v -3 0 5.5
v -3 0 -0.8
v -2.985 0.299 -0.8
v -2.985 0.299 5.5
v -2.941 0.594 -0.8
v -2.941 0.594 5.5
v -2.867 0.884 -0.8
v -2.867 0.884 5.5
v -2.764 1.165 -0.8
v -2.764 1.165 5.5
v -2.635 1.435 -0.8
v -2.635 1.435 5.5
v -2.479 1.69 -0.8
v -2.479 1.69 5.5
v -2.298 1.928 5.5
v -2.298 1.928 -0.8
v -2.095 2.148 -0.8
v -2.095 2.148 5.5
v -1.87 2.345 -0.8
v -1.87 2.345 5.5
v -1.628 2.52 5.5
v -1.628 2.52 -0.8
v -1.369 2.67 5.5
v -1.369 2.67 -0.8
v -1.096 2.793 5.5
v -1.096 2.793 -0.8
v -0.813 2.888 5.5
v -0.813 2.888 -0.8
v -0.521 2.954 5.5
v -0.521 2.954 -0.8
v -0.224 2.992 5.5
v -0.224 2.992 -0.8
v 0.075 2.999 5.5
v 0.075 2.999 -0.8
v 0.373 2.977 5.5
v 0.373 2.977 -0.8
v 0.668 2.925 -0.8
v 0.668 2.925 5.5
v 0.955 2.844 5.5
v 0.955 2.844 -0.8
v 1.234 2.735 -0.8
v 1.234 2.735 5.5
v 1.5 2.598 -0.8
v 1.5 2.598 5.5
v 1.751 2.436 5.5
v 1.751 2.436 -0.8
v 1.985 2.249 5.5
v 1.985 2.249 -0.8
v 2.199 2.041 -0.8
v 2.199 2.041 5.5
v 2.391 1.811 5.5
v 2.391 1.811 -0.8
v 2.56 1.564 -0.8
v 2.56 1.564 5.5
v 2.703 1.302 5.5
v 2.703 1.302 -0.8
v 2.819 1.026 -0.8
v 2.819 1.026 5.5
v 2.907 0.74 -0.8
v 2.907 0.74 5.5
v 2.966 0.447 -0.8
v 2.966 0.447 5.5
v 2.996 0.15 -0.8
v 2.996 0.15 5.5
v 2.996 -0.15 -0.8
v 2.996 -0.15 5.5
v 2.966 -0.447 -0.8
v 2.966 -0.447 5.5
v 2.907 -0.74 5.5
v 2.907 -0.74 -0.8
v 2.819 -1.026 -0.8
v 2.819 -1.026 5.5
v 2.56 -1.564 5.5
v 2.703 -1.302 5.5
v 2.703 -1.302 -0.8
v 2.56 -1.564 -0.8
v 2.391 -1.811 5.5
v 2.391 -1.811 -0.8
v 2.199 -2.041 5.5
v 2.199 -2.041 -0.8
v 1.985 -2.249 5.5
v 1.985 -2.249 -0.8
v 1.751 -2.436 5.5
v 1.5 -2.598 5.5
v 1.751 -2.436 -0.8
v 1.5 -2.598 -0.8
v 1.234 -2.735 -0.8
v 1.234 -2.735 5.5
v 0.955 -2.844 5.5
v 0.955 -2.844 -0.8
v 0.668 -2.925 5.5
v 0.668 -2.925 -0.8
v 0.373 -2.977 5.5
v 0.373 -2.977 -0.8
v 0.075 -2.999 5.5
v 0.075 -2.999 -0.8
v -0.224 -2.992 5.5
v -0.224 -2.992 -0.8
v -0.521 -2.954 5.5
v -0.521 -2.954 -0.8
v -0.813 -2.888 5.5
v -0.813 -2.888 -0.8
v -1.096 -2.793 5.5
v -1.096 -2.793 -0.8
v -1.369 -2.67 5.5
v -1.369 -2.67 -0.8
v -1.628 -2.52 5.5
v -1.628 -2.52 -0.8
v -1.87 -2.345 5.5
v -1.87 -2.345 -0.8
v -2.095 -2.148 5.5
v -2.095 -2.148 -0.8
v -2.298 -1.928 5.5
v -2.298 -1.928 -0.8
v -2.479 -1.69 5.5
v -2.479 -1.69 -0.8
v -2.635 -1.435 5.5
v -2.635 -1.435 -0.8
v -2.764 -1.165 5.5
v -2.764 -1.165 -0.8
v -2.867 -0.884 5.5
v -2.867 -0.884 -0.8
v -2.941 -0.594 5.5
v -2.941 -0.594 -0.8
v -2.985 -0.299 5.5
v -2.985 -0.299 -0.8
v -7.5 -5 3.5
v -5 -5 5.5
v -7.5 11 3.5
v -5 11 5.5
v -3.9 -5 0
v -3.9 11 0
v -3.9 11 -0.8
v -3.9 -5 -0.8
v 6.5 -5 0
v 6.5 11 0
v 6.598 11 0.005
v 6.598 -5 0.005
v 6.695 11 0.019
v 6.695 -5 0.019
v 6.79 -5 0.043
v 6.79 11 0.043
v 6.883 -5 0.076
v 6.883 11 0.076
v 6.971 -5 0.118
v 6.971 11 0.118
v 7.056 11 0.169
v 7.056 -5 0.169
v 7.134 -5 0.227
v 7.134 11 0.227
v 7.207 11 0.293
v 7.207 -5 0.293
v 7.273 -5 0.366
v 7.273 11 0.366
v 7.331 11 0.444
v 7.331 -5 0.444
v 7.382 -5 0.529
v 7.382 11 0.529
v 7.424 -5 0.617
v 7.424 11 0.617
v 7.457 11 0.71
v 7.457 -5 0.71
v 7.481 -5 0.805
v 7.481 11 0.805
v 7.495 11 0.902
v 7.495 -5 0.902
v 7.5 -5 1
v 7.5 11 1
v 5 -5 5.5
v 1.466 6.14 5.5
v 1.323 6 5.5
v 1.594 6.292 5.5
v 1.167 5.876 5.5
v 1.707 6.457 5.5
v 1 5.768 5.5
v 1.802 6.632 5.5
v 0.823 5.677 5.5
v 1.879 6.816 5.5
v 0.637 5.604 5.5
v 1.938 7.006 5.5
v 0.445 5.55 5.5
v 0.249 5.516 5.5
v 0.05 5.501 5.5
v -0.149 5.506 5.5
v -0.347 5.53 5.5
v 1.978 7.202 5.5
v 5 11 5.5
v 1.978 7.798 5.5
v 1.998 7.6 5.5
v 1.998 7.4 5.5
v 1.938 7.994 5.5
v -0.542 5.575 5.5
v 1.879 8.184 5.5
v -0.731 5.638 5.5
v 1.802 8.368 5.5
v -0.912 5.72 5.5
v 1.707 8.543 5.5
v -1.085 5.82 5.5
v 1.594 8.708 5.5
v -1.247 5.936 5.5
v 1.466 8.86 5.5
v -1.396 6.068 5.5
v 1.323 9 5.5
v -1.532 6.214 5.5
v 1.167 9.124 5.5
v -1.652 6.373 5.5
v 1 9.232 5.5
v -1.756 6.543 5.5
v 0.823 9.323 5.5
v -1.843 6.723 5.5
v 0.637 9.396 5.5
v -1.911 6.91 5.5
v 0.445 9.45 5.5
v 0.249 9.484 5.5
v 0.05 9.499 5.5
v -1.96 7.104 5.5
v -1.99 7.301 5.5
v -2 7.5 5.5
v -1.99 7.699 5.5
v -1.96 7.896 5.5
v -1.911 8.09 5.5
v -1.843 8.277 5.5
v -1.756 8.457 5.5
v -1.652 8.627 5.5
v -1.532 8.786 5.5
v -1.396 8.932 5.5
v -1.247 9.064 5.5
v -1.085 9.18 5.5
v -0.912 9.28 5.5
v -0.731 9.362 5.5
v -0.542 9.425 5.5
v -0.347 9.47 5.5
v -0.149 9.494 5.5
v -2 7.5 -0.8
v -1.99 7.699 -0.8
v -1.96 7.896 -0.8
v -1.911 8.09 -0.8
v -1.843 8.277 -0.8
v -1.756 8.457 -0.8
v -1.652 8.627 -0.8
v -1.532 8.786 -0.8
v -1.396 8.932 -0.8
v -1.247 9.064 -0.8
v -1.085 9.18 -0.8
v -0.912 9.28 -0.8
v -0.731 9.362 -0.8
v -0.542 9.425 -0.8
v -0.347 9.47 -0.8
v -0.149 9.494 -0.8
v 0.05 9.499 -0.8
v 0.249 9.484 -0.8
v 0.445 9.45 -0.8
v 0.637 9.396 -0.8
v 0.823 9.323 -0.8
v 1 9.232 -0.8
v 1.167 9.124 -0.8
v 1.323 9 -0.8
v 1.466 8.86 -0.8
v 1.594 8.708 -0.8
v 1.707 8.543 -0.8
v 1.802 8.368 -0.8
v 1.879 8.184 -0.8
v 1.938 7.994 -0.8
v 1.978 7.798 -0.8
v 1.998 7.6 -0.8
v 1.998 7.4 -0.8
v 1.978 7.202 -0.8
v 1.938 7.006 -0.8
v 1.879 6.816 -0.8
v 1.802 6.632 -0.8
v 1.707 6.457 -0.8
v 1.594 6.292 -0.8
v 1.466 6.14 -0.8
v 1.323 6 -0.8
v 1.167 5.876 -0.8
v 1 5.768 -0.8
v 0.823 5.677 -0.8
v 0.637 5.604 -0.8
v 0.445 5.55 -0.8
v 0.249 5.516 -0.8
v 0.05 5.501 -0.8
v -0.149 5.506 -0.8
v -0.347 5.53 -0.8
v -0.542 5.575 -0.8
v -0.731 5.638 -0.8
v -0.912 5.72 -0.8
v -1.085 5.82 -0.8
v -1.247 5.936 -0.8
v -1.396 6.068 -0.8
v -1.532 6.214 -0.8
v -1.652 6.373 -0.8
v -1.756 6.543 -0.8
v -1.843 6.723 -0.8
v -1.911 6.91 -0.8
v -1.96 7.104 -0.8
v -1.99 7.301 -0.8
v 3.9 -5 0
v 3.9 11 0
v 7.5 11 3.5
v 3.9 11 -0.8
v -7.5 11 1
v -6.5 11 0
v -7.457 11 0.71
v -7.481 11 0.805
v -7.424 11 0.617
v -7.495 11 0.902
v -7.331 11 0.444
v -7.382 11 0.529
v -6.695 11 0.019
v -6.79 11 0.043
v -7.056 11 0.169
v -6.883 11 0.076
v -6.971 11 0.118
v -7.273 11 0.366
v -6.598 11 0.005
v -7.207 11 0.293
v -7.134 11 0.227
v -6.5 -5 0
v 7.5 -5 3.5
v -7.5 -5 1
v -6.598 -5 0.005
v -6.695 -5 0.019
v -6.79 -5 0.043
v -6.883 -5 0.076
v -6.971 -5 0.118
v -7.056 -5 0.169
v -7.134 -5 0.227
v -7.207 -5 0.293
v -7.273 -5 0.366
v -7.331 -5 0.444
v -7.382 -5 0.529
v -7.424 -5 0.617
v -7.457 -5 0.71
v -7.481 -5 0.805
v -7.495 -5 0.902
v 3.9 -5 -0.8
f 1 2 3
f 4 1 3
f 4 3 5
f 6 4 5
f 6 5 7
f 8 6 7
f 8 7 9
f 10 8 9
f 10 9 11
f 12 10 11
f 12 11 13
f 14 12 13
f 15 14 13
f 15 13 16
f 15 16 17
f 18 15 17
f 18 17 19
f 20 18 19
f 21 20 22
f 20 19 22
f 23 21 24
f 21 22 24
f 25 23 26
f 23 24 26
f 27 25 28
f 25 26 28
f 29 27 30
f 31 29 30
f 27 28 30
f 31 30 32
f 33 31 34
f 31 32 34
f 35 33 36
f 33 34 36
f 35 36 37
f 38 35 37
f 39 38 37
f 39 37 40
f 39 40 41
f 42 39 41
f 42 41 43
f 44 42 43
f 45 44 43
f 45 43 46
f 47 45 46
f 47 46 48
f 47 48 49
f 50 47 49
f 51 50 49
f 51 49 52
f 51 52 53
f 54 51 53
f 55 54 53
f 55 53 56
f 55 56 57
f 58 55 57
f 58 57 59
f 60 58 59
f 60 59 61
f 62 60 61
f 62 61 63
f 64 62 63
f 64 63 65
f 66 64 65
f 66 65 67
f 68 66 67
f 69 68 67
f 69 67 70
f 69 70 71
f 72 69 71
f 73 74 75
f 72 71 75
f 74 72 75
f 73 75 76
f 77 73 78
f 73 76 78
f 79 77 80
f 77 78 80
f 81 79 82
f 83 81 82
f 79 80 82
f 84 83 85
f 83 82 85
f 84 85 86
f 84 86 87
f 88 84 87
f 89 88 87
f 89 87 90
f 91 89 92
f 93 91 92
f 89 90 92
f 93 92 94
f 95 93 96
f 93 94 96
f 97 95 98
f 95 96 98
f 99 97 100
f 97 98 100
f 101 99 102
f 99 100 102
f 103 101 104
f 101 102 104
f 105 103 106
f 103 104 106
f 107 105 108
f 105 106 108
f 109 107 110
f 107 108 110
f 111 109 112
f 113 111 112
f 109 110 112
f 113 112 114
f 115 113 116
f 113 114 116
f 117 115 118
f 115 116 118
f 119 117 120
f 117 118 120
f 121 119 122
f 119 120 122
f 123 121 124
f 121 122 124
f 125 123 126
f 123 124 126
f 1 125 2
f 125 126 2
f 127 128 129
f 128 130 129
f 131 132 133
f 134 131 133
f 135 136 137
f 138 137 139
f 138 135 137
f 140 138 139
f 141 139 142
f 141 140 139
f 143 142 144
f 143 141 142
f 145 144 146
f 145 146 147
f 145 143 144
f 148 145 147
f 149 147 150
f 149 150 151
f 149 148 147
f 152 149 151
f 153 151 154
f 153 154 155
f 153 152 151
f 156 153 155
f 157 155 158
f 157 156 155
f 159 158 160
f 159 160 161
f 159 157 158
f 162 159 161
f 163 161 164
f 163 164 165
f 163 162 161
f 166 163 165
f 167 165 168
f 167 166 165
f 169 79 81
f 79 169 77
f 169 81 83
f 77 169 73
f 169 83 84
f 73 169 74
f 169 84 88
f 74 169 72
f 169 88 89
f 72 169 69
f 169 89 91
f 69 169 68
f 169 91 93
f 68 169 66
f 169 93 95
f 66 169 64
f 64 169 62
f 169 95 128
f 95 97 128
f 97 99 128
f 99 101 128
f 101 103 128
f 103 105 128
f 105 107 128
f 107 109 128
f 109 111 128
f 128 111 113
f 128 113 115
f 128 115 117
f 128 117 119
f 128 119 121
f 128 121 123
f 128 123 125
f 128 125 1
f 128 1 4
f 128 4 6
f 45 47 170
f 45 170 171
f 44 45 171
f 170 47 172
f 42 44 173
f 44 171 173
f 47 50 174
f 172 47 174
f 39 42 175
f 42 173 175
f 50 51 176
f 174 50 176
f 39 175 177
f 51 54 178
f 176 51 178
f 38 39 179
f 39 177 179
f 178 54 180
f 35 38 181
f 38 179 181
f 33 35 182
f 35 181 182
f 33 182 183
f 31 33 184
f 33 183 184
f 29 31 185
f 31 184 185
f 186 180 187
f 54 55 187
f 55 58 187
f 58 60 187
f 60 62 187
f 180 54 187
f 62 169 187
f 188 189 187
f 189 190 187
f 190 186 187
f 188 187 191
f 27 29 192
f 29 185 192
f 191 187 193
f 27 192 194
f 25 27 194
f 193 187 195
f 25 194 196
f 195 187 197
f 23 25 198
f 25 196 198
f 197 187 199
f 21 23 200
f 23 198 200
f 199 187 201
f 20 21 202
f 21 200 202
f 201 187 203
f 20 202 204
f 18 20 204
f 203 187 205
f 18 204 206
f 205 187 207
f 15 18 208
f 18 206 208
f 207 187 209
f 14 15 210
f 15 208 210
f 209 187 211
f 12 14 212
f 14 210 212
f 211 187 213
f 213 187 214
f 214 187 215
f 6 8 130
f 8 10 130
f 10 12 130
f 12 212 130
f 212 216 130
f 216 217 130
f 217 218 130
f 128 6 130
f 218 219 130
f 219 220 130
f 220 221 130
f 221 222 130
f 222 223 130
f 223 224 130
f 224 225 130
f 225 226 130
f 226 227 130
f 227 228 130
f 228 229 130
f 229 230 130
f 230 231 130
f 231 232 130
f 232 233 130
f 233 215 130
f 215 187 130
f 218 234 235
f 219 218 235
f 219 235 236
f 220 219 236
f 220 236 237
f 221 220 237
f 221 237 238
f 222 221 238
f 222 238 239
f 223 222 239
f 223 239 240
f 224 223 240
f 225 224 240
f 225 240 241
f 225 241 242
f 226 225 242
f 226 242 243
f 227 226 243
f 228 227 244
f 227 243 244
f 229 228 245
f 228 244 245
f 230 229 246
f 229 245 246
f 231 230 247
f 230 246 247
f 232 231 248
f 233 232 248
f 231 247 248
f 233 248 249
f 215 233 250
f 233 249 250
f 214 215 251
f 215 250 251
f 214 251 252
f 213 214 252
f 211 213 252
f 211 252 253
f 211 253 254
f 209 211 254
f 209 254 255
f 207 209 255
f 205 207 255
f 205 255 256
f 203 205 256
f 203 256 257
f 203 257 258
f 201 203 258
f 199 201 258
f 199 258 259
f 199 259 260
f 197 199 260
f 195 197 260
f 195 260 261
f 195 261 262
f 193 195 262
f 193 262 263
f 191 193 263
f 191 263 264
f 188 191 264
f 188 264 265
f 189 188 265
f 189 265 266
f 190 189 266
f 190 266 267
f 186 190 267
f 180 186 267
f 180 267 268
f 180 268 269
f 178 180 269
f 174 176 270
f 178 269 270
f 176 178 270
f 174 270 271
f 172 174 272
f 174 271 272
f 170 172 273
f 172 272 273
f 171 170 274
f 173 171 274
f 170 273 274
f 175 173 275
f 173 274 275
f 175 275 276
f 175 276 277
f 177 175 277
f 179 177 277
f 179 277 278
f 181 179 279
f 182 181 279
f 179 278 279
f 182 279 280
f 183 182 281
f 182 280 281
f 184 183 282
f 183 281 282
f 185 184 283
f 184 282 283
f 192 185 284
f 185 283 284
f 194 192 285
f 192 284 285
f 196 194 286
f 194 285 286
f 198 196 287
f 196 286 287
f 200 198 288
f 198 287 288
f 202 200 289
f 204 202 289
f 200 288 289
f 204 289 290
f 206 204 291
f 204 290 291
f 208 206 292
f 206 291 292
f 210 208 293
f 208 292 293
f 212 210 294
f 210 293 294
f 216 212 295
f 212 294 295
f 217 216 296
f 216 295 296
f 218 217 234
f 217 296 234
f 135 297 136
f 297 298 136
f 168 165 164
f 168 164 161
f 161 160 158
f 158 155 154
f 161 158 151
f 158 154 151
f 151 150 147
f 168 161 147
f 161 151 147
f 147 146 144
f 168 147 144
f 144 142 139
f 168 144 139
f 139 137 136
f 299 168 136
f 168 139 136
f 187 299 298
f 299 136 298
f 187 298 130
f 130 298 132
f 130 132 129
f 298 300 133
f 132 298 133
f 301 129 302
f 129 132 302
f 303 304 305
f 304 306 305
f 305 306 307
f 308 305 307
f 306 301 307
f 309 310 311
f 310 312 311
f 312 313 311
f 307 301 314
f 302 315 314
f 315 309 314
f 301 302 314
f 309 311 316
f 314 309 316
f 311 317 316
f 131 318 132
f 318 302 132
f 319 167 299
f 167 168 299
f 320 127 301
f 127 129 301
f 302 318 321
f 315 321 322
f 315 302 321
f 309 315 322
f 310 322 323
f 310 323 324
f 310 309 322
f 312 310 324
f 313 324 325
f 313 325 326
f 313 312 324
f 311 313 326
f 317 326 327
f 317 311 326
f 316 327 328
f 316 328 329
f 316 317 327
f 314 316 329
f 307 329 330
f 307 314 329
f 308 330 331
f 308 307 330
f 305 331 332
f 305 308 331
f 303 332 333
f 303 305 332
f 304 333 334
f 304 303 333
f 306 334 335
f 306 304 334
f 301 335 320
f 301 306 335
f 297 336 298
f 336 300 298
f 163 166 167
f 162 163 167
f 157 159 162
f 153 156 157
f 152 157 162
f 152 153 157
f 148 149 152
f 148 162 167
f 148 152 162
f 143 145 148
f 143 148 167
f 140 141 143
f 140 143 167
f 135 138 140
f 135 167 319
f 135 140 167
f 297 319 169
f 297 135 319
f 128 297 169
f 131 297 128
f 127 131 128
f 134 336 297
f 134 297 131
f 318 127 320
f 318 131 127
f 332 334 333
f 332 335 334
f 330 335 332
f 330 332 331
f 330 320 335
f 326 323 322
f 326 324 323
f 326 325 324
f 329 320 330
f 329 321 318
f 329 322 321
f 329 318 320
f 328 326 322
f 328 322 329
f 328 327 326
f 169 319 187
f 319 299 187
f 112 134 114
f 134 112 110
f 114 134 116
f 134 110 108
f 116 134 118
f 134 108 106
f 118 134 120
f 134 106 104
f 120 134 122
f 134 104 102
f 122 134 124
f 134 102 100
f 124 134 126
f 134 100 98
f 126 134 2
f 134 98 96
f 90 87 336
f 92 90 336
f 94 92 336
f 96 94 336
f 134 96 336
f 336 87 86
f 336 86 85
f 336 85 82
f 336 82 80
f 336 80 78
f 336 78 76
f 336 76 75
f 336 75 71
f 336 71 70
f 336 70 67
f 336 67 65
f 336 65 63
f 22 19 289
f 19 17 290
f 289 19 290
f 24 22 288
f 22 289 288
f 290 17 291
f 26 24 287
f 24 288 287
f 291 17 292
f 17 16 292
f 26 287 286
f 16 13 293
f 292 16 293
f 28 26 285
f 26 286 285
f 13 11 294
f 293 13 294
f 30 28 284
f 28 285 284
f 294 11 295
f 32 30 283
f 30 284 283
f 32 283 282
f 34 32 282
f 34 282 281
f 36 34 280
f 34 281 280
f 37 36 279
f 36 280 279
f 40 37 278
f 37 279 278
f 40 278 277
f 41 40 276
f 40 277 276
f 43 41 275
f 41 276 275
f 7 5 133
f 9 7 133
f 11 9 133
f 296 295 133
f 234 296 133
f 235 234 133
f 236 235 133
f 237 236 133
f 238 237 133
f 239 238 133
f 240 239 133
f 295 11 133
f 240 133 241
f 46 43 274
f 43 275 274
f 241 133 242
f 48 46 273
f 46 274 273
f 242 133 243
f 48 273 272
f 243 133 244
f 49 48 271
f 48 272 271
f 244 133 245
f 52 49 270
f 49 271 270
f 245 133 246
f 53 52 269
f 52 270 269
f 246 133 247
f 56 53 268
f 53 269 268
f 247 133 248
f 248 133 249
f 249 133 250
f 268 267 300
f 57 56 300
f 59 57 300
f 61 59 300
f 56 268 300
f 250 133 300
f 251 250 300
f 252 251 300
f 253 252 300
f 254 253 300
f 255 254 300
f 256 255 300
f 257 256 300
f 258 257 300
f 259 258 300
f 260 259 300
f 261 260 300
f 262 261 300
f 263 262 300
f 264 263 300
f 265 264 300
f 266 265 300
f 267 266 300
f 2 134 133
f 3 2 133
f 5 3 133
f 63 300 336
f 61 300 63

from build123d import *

# Parameters (mm, degrees)
BOSS_EXTRUDE1_DEPTH      = 11
BOSS_EXTRUDE1_DEPTH_BACK = 5
SKETCH2_R                = 3
SKETCH2_R_2              = 2
CUT_EXTRUDE1_DEPTH       = 7.3
FILLET1_R                = 1


with BuildPart() as part:
    # Sketch1 → Boss-Extrude1 (new body, two sides)
    with BuildSketch(Plane(origin=(0, 0, 0), x_dir=(1, 0, 0), z_dir=(0, 1, 0))) as boss_extrude1_sk:
        Polygon((-3.9, 0.8), (3.9, 0.8), (3.9, 0), (7.5, 0), (7.5, -3.5), (5, -5.5), (-5, -5.5), (-7.5, -3.5), (-7.5, 0), (-3.9, 0), align=None)
    extrude(amount=BOSS_EXTRUDE1_DEPTH)
    extrude(boss_extrude1_sk.sketch, amount=-BOSS_EXTRUDE1_DEPTH_BACK)

    # Sketch2 → Cut-Extrude1 (cut, through all)
    with BuildSketch(Plane(origin=(0, 0, -0.8), x_dir=(-1, 0, 0), z_dir=(0, 0, -1))):
        Circle(SKETCH2_R)
        with Locations((0, 7.5)):
            Circle(SKETCH2_R_2)
    extrude(amount=-CUT_EXTRUDE1_DEPTH, mode=Mode.SUBTRACT)

    # Fillet1
    fillet1_edges = [part.edges().sort_by_distance(p)[0] for p in [
        (7.5, 3, 0),
        (-7.5, 3, 0),
    ]]
    fillet(fillet1_edges, radius=FILLET1_R)


solid = part.part
